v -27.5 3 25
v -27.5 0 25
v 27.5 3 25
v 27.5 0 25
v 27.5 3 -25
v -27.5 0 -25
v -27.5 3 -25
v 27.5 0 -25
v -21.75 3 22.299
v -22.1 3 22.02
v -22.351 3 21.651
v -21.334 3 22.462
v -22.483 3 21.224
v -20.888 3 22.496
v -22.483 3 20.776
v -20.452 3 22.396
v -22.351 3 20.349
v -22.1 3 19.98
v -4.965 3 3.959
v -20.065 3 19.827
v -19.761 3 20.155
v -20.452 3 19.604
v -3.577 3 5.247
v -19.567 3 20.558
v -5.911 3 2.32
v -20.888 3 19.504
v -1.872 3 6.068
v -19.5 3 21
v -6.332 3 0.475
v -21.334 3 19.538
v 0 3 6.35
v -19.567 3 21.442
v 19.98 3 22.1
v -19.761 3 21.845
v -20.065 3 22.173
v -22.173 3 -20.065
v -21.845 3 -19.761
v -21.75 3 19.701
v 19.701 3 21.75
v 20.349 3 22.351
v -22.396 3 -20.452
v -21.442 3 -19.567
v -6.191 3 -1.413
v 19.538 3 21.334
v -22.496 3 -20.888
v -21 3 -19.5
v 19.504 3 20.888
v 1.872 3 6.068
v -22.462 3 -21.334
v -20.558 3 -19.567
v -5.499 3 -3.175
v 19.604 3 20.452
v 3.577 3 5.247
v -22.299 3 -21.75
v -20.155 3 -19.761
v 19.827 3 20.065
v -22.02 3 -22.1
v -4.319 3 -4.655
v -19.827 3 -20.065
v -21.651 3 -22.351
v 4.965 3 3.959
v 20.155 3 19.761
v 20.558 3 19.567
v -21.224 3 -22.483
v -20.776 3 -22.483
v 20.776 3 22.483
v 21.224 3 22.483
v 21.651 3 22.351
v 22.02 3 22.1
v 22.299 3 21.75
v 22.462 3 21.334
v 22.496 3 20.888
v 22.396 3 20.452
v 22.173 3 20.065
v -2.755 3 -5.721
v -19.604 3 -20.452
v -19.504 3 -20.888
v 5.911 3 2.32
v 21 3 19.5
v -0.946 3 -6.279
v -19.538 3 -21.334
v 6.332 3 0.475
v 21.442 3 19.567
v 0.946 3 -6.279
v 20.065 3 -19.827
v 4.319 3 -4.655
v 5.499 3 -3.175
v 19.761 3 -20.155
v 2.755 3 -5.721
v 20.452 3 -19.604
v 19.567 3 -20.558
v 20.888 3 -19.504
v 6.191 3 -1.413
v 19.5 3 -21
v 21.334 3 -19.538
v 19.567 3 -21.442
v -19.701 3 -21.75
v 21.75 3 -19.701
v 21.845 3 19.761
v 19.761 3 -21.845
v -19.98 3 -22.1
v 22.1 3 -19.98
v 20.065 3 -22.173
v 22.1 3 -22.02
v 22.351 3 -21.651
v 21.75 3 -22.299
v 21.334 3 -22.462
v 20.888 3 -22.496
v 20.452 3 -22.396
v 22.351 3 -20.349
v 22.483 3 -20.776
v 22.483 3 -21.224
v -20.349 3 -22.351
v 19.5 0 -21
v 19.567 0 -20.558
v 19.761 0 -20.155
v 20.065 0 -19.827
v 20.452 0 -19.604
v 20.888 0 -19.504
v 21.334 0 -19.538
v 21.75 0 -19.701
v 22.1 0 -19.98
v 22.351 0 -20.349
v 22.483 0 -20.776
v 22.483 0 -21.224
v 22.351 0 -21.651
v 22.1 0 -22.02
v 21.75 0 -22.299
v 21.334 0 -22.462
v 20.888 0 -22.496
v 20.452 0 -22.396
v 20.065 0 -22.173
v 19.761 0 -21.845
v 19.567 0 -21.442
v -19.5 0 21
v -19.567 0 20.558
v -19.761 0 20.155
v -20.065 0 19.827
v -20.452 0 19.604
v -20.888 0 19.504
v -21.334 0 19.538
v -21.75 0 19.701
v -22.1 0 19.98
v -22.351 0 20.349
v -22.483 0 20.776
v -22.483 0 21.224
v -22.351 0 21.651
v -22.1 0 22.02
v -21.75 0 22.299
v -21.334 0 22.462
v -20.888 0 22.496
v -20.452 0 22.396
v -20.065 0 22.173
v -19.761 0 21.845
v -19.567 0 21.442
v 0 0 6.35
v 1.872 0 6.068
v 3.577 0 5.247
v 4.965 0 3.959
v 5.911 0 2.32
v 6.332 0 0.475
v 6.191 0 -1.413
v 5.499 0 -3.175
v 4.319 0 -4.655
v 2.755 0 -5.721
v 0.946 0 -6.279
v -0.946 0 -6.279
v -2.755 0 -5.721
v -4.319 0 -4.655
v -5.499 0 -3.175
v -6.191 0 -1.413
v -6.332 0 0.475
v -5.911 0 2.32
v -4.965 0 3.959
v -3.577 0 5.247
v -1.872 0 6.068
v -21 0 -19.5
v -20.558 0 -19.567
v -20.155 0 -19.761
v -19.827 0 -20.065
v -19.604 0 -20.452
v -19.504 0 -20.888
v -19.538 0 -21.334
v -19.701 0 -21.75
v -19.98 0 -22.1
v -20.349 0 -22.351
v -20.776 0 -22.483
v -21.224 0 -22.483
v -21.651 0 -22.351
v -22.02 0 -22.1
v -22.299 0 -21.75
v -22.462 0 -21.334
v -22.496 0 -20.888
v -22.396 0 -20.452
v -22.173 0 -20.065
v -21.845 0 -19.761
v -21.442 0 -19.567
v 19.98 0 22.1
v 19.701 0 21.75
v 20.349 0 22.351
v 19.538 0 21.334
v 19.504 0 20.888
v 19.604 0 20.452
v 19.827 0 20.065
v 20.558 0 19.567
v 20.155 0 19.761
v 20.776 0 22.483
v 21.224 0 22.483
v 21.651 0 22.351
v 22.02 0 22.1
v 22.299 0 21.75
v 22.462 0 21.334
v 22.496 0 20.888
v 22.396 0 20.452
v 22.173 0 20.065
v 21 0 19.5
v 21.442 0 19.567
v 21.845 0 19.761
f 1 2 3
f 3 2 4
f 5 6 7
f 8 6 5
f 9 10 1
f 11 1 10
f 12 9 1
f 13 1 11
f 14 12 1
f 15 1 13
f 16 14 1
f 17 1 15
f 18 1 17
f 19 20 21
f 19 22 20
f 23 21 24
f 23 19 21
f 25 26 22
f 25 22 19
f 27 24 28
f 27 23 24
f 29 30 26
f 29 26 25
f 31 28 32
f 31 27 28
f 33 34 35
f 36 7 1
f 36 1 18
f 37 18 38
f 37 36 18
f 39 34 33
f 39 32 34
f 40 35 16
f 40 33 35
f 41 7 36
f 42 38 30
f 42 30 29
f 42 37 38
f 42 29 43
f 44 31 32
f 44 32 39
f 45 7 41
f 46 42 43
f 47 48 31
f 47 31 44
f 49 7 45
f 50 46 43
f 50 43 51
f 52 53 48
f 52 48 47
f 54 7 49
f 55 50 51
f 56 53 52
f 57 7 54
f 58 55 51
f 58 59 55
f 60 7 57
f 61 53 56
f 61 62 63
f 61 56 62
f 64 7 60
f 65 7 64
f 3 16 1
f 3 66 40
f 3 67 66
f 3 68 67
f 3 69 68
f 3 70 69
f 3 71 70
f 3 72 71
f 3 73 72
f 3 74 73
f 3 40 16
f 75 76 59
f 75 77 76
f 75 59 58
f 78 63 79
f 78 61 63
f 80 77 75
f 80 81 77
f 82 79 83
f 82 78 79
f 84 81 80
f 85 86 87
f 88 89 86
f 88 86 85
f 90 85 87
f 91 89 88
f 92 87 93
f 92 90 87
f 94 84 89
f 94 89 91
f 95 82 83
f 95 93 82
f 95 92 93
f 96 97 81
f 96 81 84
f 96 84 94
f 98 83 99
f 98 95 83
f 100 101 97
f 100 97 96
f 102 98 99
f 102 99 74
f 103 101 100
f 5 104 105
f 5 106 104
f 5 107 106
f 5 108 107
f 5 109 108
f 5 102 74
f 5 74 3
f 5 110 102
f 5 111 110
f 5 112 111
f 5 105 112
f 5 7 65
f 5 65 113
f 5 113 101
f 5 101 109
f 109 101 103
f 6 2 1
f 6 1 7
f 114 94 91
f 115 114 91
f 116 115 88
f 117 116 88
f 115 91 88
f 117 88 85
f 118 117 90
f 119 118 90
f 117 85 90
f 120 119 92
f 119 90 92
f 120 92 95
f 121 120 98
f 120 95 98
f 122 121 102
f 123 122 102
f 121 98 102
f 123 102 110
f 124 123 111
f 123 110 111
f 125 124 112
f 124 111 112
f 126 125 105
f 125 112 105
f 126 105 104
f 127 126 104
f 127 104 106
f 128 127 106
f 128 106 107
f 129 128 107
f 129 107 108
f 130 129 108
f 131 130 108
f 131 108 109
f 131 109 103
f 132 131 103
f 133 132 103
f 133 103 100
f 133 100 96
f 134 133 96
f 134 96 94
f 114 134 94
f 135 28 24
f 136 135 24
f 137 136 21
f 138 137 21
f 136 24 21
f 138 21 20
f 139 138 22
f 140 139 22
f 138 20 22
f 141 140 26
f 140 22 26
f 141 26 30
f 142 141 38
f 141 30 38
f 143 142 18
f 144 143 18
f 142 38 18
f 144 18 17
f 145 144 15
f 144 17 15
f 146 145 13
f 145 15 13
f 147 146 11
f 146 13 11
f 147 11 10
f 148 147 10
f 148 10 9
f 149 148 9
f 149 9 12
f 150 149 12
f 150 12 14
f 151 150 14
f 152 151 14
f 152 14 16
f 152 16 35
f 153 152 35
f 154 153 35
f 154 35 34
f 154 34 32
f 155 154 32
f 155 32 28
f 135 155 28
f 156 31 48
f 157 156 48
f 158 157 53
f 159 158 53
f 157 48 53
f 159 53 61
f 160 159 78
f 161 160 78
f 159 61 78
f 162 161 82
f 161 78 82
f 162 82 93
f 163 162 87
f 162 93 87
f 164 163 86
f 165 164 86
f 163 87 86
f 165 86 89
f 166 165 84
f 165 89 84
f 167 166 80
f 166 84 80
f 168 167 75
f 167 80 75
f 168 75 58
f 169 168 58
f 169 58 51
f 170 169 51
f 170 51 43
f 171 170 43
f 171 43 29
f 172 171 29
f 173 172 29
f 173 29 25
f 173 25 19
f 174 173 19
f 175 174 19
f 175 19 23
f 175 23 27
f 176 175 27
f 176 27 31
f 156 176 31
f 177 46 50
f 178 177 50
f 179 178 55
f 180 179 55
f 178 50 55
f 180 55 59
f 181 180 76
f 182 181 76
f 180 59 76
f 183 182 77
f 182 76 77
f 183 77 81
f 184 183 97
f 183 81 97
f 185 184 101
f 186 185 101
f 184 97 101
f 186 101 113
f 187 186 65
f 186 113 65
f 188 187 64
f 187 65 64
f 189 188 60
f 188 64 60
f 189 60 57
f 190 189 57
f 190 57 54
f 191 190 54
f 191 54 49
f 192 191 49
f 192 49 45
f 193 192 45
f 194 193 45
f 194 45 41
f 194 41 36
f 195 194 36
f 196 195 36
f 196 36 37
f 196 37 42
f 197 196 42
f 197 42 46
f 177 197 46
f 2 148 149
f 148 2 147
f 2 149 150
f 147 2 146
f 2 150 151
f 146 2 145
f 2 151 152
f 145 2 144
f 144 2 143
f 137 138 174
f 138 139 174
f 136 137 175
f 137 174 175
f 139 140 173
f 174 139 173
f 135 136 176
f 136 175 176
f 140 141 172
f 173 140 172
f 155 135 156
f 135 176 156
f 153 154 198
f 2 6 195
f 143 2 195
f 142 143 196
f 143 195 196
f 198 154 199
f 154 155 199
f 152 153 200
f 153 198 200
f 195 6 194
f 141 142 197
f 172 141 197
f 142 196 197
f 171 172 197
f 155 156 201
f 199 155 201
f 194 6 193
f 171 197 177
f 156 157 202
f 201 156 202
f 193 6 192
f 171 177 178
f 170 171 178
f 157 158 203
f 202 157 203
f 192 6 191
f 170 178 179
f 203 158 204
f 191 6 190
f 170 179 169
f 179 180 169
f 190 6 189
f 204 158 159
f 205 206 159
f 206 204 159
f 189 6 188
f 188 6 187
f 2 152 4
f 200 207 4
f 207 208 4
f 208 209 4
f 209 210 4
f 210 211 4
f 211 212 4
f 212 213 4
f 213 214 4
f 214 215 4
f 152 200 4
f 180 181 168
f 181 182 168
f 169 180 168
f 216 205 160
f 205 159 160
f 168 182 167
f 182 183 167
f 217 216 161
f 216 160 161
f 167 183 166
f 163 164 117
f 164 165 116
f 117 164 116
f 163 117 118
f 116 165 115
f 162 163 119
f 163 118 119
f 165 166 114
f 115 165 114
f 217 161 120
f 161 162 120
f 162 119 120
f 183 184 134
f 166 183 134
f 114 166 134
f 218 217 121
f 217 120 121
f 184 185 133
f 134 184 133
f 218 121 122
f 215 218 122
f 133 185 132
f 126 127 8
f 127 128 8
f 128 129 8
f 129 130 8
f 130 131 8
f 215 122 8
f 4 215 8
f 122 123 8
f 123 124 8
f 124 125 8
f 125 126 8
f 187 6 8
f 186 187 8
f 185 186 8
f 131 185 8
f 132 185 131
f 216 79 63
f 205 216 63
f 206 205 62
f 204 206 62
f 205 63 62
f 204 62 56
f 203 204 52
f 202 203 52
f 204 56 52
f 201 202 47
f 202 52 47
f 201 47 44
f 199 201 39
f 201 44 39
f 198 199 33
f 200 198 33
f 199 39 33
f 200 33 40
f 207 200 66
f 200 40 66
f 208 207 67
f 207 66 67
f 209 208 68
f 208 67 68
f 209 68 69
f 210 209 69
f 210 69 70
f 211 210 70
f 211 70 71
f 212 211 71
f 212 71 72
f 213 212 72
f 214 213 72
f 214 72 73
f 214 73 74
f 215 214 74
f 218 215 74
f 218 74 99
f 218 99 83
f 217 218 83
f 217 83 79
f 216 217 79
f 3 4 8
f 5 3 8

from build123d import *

# Parameters (mm, degrees)
SKETCH1_W           = 55
SKETCH1_H           = 50
BOSS_EXTRUDE1_DEPTH = 3
SKETCH2_R           = 6.35
CUT_EXTRUDE1_DEPTH  = 38.286056375
SKETCH3_R           = 1.5
CUT_EXTRUDE2_DEPTH  = 38.286056375
CIRPATTERN1_COUNT   = 4


with BuildPart() as part:
    # Sketch1 → Boss-Extrude1 (new body)
    with BuildSketch(Plane(origin=(0, 0, 0), x_dir=(1, 0, 0), z_dir=(0, 1, 0))):
        Rectangle(SKETCH1_W, SKETCH1_H)
    extrude(amount=BOSS_EXTRUDE1_DEPTH)

    # Sketch2 → Cut-Extrude1 (cut, through all)
    with BuildSketch(Plane(origin=(0, 3, 0), x_dir=(1, 0, 0), z_dir=(0, 1, 0))):
        with Locations(Location((0, 0, 0), (0, 0, 270))):
            Circle(SKETCH2_R)
    extrude(amount=-CUT_EXTRUDE1_DEPTH, mode=Mode.SUBTRACT)

    # Sketch3 → Cut-Extrude2 (cut, through all)
    with BuildSketch(Plane(origin=(0, 3, 0), x_dir=(1, 0, 0), z_dir=(0, 1, 0))):
        with Locations(Location((-21, 21, 0), (0, 0, 270))):
            Circle(SKETCH3_R)
    cut_extrude2 = extrude(amount=-CUT_EXTRUDE2_DEPTH, mode=Mode.SUBTRACT)

    # CirPattern1: Cut-Extrude2 ×4 about axis
    cirpattern1_axis = Axis((0, 0, 0), (0, 1, 0))
    for i in range(1, CIRPATTERN1_COUNT):
        add(cut_extrude2.rotate(cirpattern1_axis, i * 360 / CIRPATTERN1_COUNT), mode=Mode.SUBTRACT)


solid = part.part
